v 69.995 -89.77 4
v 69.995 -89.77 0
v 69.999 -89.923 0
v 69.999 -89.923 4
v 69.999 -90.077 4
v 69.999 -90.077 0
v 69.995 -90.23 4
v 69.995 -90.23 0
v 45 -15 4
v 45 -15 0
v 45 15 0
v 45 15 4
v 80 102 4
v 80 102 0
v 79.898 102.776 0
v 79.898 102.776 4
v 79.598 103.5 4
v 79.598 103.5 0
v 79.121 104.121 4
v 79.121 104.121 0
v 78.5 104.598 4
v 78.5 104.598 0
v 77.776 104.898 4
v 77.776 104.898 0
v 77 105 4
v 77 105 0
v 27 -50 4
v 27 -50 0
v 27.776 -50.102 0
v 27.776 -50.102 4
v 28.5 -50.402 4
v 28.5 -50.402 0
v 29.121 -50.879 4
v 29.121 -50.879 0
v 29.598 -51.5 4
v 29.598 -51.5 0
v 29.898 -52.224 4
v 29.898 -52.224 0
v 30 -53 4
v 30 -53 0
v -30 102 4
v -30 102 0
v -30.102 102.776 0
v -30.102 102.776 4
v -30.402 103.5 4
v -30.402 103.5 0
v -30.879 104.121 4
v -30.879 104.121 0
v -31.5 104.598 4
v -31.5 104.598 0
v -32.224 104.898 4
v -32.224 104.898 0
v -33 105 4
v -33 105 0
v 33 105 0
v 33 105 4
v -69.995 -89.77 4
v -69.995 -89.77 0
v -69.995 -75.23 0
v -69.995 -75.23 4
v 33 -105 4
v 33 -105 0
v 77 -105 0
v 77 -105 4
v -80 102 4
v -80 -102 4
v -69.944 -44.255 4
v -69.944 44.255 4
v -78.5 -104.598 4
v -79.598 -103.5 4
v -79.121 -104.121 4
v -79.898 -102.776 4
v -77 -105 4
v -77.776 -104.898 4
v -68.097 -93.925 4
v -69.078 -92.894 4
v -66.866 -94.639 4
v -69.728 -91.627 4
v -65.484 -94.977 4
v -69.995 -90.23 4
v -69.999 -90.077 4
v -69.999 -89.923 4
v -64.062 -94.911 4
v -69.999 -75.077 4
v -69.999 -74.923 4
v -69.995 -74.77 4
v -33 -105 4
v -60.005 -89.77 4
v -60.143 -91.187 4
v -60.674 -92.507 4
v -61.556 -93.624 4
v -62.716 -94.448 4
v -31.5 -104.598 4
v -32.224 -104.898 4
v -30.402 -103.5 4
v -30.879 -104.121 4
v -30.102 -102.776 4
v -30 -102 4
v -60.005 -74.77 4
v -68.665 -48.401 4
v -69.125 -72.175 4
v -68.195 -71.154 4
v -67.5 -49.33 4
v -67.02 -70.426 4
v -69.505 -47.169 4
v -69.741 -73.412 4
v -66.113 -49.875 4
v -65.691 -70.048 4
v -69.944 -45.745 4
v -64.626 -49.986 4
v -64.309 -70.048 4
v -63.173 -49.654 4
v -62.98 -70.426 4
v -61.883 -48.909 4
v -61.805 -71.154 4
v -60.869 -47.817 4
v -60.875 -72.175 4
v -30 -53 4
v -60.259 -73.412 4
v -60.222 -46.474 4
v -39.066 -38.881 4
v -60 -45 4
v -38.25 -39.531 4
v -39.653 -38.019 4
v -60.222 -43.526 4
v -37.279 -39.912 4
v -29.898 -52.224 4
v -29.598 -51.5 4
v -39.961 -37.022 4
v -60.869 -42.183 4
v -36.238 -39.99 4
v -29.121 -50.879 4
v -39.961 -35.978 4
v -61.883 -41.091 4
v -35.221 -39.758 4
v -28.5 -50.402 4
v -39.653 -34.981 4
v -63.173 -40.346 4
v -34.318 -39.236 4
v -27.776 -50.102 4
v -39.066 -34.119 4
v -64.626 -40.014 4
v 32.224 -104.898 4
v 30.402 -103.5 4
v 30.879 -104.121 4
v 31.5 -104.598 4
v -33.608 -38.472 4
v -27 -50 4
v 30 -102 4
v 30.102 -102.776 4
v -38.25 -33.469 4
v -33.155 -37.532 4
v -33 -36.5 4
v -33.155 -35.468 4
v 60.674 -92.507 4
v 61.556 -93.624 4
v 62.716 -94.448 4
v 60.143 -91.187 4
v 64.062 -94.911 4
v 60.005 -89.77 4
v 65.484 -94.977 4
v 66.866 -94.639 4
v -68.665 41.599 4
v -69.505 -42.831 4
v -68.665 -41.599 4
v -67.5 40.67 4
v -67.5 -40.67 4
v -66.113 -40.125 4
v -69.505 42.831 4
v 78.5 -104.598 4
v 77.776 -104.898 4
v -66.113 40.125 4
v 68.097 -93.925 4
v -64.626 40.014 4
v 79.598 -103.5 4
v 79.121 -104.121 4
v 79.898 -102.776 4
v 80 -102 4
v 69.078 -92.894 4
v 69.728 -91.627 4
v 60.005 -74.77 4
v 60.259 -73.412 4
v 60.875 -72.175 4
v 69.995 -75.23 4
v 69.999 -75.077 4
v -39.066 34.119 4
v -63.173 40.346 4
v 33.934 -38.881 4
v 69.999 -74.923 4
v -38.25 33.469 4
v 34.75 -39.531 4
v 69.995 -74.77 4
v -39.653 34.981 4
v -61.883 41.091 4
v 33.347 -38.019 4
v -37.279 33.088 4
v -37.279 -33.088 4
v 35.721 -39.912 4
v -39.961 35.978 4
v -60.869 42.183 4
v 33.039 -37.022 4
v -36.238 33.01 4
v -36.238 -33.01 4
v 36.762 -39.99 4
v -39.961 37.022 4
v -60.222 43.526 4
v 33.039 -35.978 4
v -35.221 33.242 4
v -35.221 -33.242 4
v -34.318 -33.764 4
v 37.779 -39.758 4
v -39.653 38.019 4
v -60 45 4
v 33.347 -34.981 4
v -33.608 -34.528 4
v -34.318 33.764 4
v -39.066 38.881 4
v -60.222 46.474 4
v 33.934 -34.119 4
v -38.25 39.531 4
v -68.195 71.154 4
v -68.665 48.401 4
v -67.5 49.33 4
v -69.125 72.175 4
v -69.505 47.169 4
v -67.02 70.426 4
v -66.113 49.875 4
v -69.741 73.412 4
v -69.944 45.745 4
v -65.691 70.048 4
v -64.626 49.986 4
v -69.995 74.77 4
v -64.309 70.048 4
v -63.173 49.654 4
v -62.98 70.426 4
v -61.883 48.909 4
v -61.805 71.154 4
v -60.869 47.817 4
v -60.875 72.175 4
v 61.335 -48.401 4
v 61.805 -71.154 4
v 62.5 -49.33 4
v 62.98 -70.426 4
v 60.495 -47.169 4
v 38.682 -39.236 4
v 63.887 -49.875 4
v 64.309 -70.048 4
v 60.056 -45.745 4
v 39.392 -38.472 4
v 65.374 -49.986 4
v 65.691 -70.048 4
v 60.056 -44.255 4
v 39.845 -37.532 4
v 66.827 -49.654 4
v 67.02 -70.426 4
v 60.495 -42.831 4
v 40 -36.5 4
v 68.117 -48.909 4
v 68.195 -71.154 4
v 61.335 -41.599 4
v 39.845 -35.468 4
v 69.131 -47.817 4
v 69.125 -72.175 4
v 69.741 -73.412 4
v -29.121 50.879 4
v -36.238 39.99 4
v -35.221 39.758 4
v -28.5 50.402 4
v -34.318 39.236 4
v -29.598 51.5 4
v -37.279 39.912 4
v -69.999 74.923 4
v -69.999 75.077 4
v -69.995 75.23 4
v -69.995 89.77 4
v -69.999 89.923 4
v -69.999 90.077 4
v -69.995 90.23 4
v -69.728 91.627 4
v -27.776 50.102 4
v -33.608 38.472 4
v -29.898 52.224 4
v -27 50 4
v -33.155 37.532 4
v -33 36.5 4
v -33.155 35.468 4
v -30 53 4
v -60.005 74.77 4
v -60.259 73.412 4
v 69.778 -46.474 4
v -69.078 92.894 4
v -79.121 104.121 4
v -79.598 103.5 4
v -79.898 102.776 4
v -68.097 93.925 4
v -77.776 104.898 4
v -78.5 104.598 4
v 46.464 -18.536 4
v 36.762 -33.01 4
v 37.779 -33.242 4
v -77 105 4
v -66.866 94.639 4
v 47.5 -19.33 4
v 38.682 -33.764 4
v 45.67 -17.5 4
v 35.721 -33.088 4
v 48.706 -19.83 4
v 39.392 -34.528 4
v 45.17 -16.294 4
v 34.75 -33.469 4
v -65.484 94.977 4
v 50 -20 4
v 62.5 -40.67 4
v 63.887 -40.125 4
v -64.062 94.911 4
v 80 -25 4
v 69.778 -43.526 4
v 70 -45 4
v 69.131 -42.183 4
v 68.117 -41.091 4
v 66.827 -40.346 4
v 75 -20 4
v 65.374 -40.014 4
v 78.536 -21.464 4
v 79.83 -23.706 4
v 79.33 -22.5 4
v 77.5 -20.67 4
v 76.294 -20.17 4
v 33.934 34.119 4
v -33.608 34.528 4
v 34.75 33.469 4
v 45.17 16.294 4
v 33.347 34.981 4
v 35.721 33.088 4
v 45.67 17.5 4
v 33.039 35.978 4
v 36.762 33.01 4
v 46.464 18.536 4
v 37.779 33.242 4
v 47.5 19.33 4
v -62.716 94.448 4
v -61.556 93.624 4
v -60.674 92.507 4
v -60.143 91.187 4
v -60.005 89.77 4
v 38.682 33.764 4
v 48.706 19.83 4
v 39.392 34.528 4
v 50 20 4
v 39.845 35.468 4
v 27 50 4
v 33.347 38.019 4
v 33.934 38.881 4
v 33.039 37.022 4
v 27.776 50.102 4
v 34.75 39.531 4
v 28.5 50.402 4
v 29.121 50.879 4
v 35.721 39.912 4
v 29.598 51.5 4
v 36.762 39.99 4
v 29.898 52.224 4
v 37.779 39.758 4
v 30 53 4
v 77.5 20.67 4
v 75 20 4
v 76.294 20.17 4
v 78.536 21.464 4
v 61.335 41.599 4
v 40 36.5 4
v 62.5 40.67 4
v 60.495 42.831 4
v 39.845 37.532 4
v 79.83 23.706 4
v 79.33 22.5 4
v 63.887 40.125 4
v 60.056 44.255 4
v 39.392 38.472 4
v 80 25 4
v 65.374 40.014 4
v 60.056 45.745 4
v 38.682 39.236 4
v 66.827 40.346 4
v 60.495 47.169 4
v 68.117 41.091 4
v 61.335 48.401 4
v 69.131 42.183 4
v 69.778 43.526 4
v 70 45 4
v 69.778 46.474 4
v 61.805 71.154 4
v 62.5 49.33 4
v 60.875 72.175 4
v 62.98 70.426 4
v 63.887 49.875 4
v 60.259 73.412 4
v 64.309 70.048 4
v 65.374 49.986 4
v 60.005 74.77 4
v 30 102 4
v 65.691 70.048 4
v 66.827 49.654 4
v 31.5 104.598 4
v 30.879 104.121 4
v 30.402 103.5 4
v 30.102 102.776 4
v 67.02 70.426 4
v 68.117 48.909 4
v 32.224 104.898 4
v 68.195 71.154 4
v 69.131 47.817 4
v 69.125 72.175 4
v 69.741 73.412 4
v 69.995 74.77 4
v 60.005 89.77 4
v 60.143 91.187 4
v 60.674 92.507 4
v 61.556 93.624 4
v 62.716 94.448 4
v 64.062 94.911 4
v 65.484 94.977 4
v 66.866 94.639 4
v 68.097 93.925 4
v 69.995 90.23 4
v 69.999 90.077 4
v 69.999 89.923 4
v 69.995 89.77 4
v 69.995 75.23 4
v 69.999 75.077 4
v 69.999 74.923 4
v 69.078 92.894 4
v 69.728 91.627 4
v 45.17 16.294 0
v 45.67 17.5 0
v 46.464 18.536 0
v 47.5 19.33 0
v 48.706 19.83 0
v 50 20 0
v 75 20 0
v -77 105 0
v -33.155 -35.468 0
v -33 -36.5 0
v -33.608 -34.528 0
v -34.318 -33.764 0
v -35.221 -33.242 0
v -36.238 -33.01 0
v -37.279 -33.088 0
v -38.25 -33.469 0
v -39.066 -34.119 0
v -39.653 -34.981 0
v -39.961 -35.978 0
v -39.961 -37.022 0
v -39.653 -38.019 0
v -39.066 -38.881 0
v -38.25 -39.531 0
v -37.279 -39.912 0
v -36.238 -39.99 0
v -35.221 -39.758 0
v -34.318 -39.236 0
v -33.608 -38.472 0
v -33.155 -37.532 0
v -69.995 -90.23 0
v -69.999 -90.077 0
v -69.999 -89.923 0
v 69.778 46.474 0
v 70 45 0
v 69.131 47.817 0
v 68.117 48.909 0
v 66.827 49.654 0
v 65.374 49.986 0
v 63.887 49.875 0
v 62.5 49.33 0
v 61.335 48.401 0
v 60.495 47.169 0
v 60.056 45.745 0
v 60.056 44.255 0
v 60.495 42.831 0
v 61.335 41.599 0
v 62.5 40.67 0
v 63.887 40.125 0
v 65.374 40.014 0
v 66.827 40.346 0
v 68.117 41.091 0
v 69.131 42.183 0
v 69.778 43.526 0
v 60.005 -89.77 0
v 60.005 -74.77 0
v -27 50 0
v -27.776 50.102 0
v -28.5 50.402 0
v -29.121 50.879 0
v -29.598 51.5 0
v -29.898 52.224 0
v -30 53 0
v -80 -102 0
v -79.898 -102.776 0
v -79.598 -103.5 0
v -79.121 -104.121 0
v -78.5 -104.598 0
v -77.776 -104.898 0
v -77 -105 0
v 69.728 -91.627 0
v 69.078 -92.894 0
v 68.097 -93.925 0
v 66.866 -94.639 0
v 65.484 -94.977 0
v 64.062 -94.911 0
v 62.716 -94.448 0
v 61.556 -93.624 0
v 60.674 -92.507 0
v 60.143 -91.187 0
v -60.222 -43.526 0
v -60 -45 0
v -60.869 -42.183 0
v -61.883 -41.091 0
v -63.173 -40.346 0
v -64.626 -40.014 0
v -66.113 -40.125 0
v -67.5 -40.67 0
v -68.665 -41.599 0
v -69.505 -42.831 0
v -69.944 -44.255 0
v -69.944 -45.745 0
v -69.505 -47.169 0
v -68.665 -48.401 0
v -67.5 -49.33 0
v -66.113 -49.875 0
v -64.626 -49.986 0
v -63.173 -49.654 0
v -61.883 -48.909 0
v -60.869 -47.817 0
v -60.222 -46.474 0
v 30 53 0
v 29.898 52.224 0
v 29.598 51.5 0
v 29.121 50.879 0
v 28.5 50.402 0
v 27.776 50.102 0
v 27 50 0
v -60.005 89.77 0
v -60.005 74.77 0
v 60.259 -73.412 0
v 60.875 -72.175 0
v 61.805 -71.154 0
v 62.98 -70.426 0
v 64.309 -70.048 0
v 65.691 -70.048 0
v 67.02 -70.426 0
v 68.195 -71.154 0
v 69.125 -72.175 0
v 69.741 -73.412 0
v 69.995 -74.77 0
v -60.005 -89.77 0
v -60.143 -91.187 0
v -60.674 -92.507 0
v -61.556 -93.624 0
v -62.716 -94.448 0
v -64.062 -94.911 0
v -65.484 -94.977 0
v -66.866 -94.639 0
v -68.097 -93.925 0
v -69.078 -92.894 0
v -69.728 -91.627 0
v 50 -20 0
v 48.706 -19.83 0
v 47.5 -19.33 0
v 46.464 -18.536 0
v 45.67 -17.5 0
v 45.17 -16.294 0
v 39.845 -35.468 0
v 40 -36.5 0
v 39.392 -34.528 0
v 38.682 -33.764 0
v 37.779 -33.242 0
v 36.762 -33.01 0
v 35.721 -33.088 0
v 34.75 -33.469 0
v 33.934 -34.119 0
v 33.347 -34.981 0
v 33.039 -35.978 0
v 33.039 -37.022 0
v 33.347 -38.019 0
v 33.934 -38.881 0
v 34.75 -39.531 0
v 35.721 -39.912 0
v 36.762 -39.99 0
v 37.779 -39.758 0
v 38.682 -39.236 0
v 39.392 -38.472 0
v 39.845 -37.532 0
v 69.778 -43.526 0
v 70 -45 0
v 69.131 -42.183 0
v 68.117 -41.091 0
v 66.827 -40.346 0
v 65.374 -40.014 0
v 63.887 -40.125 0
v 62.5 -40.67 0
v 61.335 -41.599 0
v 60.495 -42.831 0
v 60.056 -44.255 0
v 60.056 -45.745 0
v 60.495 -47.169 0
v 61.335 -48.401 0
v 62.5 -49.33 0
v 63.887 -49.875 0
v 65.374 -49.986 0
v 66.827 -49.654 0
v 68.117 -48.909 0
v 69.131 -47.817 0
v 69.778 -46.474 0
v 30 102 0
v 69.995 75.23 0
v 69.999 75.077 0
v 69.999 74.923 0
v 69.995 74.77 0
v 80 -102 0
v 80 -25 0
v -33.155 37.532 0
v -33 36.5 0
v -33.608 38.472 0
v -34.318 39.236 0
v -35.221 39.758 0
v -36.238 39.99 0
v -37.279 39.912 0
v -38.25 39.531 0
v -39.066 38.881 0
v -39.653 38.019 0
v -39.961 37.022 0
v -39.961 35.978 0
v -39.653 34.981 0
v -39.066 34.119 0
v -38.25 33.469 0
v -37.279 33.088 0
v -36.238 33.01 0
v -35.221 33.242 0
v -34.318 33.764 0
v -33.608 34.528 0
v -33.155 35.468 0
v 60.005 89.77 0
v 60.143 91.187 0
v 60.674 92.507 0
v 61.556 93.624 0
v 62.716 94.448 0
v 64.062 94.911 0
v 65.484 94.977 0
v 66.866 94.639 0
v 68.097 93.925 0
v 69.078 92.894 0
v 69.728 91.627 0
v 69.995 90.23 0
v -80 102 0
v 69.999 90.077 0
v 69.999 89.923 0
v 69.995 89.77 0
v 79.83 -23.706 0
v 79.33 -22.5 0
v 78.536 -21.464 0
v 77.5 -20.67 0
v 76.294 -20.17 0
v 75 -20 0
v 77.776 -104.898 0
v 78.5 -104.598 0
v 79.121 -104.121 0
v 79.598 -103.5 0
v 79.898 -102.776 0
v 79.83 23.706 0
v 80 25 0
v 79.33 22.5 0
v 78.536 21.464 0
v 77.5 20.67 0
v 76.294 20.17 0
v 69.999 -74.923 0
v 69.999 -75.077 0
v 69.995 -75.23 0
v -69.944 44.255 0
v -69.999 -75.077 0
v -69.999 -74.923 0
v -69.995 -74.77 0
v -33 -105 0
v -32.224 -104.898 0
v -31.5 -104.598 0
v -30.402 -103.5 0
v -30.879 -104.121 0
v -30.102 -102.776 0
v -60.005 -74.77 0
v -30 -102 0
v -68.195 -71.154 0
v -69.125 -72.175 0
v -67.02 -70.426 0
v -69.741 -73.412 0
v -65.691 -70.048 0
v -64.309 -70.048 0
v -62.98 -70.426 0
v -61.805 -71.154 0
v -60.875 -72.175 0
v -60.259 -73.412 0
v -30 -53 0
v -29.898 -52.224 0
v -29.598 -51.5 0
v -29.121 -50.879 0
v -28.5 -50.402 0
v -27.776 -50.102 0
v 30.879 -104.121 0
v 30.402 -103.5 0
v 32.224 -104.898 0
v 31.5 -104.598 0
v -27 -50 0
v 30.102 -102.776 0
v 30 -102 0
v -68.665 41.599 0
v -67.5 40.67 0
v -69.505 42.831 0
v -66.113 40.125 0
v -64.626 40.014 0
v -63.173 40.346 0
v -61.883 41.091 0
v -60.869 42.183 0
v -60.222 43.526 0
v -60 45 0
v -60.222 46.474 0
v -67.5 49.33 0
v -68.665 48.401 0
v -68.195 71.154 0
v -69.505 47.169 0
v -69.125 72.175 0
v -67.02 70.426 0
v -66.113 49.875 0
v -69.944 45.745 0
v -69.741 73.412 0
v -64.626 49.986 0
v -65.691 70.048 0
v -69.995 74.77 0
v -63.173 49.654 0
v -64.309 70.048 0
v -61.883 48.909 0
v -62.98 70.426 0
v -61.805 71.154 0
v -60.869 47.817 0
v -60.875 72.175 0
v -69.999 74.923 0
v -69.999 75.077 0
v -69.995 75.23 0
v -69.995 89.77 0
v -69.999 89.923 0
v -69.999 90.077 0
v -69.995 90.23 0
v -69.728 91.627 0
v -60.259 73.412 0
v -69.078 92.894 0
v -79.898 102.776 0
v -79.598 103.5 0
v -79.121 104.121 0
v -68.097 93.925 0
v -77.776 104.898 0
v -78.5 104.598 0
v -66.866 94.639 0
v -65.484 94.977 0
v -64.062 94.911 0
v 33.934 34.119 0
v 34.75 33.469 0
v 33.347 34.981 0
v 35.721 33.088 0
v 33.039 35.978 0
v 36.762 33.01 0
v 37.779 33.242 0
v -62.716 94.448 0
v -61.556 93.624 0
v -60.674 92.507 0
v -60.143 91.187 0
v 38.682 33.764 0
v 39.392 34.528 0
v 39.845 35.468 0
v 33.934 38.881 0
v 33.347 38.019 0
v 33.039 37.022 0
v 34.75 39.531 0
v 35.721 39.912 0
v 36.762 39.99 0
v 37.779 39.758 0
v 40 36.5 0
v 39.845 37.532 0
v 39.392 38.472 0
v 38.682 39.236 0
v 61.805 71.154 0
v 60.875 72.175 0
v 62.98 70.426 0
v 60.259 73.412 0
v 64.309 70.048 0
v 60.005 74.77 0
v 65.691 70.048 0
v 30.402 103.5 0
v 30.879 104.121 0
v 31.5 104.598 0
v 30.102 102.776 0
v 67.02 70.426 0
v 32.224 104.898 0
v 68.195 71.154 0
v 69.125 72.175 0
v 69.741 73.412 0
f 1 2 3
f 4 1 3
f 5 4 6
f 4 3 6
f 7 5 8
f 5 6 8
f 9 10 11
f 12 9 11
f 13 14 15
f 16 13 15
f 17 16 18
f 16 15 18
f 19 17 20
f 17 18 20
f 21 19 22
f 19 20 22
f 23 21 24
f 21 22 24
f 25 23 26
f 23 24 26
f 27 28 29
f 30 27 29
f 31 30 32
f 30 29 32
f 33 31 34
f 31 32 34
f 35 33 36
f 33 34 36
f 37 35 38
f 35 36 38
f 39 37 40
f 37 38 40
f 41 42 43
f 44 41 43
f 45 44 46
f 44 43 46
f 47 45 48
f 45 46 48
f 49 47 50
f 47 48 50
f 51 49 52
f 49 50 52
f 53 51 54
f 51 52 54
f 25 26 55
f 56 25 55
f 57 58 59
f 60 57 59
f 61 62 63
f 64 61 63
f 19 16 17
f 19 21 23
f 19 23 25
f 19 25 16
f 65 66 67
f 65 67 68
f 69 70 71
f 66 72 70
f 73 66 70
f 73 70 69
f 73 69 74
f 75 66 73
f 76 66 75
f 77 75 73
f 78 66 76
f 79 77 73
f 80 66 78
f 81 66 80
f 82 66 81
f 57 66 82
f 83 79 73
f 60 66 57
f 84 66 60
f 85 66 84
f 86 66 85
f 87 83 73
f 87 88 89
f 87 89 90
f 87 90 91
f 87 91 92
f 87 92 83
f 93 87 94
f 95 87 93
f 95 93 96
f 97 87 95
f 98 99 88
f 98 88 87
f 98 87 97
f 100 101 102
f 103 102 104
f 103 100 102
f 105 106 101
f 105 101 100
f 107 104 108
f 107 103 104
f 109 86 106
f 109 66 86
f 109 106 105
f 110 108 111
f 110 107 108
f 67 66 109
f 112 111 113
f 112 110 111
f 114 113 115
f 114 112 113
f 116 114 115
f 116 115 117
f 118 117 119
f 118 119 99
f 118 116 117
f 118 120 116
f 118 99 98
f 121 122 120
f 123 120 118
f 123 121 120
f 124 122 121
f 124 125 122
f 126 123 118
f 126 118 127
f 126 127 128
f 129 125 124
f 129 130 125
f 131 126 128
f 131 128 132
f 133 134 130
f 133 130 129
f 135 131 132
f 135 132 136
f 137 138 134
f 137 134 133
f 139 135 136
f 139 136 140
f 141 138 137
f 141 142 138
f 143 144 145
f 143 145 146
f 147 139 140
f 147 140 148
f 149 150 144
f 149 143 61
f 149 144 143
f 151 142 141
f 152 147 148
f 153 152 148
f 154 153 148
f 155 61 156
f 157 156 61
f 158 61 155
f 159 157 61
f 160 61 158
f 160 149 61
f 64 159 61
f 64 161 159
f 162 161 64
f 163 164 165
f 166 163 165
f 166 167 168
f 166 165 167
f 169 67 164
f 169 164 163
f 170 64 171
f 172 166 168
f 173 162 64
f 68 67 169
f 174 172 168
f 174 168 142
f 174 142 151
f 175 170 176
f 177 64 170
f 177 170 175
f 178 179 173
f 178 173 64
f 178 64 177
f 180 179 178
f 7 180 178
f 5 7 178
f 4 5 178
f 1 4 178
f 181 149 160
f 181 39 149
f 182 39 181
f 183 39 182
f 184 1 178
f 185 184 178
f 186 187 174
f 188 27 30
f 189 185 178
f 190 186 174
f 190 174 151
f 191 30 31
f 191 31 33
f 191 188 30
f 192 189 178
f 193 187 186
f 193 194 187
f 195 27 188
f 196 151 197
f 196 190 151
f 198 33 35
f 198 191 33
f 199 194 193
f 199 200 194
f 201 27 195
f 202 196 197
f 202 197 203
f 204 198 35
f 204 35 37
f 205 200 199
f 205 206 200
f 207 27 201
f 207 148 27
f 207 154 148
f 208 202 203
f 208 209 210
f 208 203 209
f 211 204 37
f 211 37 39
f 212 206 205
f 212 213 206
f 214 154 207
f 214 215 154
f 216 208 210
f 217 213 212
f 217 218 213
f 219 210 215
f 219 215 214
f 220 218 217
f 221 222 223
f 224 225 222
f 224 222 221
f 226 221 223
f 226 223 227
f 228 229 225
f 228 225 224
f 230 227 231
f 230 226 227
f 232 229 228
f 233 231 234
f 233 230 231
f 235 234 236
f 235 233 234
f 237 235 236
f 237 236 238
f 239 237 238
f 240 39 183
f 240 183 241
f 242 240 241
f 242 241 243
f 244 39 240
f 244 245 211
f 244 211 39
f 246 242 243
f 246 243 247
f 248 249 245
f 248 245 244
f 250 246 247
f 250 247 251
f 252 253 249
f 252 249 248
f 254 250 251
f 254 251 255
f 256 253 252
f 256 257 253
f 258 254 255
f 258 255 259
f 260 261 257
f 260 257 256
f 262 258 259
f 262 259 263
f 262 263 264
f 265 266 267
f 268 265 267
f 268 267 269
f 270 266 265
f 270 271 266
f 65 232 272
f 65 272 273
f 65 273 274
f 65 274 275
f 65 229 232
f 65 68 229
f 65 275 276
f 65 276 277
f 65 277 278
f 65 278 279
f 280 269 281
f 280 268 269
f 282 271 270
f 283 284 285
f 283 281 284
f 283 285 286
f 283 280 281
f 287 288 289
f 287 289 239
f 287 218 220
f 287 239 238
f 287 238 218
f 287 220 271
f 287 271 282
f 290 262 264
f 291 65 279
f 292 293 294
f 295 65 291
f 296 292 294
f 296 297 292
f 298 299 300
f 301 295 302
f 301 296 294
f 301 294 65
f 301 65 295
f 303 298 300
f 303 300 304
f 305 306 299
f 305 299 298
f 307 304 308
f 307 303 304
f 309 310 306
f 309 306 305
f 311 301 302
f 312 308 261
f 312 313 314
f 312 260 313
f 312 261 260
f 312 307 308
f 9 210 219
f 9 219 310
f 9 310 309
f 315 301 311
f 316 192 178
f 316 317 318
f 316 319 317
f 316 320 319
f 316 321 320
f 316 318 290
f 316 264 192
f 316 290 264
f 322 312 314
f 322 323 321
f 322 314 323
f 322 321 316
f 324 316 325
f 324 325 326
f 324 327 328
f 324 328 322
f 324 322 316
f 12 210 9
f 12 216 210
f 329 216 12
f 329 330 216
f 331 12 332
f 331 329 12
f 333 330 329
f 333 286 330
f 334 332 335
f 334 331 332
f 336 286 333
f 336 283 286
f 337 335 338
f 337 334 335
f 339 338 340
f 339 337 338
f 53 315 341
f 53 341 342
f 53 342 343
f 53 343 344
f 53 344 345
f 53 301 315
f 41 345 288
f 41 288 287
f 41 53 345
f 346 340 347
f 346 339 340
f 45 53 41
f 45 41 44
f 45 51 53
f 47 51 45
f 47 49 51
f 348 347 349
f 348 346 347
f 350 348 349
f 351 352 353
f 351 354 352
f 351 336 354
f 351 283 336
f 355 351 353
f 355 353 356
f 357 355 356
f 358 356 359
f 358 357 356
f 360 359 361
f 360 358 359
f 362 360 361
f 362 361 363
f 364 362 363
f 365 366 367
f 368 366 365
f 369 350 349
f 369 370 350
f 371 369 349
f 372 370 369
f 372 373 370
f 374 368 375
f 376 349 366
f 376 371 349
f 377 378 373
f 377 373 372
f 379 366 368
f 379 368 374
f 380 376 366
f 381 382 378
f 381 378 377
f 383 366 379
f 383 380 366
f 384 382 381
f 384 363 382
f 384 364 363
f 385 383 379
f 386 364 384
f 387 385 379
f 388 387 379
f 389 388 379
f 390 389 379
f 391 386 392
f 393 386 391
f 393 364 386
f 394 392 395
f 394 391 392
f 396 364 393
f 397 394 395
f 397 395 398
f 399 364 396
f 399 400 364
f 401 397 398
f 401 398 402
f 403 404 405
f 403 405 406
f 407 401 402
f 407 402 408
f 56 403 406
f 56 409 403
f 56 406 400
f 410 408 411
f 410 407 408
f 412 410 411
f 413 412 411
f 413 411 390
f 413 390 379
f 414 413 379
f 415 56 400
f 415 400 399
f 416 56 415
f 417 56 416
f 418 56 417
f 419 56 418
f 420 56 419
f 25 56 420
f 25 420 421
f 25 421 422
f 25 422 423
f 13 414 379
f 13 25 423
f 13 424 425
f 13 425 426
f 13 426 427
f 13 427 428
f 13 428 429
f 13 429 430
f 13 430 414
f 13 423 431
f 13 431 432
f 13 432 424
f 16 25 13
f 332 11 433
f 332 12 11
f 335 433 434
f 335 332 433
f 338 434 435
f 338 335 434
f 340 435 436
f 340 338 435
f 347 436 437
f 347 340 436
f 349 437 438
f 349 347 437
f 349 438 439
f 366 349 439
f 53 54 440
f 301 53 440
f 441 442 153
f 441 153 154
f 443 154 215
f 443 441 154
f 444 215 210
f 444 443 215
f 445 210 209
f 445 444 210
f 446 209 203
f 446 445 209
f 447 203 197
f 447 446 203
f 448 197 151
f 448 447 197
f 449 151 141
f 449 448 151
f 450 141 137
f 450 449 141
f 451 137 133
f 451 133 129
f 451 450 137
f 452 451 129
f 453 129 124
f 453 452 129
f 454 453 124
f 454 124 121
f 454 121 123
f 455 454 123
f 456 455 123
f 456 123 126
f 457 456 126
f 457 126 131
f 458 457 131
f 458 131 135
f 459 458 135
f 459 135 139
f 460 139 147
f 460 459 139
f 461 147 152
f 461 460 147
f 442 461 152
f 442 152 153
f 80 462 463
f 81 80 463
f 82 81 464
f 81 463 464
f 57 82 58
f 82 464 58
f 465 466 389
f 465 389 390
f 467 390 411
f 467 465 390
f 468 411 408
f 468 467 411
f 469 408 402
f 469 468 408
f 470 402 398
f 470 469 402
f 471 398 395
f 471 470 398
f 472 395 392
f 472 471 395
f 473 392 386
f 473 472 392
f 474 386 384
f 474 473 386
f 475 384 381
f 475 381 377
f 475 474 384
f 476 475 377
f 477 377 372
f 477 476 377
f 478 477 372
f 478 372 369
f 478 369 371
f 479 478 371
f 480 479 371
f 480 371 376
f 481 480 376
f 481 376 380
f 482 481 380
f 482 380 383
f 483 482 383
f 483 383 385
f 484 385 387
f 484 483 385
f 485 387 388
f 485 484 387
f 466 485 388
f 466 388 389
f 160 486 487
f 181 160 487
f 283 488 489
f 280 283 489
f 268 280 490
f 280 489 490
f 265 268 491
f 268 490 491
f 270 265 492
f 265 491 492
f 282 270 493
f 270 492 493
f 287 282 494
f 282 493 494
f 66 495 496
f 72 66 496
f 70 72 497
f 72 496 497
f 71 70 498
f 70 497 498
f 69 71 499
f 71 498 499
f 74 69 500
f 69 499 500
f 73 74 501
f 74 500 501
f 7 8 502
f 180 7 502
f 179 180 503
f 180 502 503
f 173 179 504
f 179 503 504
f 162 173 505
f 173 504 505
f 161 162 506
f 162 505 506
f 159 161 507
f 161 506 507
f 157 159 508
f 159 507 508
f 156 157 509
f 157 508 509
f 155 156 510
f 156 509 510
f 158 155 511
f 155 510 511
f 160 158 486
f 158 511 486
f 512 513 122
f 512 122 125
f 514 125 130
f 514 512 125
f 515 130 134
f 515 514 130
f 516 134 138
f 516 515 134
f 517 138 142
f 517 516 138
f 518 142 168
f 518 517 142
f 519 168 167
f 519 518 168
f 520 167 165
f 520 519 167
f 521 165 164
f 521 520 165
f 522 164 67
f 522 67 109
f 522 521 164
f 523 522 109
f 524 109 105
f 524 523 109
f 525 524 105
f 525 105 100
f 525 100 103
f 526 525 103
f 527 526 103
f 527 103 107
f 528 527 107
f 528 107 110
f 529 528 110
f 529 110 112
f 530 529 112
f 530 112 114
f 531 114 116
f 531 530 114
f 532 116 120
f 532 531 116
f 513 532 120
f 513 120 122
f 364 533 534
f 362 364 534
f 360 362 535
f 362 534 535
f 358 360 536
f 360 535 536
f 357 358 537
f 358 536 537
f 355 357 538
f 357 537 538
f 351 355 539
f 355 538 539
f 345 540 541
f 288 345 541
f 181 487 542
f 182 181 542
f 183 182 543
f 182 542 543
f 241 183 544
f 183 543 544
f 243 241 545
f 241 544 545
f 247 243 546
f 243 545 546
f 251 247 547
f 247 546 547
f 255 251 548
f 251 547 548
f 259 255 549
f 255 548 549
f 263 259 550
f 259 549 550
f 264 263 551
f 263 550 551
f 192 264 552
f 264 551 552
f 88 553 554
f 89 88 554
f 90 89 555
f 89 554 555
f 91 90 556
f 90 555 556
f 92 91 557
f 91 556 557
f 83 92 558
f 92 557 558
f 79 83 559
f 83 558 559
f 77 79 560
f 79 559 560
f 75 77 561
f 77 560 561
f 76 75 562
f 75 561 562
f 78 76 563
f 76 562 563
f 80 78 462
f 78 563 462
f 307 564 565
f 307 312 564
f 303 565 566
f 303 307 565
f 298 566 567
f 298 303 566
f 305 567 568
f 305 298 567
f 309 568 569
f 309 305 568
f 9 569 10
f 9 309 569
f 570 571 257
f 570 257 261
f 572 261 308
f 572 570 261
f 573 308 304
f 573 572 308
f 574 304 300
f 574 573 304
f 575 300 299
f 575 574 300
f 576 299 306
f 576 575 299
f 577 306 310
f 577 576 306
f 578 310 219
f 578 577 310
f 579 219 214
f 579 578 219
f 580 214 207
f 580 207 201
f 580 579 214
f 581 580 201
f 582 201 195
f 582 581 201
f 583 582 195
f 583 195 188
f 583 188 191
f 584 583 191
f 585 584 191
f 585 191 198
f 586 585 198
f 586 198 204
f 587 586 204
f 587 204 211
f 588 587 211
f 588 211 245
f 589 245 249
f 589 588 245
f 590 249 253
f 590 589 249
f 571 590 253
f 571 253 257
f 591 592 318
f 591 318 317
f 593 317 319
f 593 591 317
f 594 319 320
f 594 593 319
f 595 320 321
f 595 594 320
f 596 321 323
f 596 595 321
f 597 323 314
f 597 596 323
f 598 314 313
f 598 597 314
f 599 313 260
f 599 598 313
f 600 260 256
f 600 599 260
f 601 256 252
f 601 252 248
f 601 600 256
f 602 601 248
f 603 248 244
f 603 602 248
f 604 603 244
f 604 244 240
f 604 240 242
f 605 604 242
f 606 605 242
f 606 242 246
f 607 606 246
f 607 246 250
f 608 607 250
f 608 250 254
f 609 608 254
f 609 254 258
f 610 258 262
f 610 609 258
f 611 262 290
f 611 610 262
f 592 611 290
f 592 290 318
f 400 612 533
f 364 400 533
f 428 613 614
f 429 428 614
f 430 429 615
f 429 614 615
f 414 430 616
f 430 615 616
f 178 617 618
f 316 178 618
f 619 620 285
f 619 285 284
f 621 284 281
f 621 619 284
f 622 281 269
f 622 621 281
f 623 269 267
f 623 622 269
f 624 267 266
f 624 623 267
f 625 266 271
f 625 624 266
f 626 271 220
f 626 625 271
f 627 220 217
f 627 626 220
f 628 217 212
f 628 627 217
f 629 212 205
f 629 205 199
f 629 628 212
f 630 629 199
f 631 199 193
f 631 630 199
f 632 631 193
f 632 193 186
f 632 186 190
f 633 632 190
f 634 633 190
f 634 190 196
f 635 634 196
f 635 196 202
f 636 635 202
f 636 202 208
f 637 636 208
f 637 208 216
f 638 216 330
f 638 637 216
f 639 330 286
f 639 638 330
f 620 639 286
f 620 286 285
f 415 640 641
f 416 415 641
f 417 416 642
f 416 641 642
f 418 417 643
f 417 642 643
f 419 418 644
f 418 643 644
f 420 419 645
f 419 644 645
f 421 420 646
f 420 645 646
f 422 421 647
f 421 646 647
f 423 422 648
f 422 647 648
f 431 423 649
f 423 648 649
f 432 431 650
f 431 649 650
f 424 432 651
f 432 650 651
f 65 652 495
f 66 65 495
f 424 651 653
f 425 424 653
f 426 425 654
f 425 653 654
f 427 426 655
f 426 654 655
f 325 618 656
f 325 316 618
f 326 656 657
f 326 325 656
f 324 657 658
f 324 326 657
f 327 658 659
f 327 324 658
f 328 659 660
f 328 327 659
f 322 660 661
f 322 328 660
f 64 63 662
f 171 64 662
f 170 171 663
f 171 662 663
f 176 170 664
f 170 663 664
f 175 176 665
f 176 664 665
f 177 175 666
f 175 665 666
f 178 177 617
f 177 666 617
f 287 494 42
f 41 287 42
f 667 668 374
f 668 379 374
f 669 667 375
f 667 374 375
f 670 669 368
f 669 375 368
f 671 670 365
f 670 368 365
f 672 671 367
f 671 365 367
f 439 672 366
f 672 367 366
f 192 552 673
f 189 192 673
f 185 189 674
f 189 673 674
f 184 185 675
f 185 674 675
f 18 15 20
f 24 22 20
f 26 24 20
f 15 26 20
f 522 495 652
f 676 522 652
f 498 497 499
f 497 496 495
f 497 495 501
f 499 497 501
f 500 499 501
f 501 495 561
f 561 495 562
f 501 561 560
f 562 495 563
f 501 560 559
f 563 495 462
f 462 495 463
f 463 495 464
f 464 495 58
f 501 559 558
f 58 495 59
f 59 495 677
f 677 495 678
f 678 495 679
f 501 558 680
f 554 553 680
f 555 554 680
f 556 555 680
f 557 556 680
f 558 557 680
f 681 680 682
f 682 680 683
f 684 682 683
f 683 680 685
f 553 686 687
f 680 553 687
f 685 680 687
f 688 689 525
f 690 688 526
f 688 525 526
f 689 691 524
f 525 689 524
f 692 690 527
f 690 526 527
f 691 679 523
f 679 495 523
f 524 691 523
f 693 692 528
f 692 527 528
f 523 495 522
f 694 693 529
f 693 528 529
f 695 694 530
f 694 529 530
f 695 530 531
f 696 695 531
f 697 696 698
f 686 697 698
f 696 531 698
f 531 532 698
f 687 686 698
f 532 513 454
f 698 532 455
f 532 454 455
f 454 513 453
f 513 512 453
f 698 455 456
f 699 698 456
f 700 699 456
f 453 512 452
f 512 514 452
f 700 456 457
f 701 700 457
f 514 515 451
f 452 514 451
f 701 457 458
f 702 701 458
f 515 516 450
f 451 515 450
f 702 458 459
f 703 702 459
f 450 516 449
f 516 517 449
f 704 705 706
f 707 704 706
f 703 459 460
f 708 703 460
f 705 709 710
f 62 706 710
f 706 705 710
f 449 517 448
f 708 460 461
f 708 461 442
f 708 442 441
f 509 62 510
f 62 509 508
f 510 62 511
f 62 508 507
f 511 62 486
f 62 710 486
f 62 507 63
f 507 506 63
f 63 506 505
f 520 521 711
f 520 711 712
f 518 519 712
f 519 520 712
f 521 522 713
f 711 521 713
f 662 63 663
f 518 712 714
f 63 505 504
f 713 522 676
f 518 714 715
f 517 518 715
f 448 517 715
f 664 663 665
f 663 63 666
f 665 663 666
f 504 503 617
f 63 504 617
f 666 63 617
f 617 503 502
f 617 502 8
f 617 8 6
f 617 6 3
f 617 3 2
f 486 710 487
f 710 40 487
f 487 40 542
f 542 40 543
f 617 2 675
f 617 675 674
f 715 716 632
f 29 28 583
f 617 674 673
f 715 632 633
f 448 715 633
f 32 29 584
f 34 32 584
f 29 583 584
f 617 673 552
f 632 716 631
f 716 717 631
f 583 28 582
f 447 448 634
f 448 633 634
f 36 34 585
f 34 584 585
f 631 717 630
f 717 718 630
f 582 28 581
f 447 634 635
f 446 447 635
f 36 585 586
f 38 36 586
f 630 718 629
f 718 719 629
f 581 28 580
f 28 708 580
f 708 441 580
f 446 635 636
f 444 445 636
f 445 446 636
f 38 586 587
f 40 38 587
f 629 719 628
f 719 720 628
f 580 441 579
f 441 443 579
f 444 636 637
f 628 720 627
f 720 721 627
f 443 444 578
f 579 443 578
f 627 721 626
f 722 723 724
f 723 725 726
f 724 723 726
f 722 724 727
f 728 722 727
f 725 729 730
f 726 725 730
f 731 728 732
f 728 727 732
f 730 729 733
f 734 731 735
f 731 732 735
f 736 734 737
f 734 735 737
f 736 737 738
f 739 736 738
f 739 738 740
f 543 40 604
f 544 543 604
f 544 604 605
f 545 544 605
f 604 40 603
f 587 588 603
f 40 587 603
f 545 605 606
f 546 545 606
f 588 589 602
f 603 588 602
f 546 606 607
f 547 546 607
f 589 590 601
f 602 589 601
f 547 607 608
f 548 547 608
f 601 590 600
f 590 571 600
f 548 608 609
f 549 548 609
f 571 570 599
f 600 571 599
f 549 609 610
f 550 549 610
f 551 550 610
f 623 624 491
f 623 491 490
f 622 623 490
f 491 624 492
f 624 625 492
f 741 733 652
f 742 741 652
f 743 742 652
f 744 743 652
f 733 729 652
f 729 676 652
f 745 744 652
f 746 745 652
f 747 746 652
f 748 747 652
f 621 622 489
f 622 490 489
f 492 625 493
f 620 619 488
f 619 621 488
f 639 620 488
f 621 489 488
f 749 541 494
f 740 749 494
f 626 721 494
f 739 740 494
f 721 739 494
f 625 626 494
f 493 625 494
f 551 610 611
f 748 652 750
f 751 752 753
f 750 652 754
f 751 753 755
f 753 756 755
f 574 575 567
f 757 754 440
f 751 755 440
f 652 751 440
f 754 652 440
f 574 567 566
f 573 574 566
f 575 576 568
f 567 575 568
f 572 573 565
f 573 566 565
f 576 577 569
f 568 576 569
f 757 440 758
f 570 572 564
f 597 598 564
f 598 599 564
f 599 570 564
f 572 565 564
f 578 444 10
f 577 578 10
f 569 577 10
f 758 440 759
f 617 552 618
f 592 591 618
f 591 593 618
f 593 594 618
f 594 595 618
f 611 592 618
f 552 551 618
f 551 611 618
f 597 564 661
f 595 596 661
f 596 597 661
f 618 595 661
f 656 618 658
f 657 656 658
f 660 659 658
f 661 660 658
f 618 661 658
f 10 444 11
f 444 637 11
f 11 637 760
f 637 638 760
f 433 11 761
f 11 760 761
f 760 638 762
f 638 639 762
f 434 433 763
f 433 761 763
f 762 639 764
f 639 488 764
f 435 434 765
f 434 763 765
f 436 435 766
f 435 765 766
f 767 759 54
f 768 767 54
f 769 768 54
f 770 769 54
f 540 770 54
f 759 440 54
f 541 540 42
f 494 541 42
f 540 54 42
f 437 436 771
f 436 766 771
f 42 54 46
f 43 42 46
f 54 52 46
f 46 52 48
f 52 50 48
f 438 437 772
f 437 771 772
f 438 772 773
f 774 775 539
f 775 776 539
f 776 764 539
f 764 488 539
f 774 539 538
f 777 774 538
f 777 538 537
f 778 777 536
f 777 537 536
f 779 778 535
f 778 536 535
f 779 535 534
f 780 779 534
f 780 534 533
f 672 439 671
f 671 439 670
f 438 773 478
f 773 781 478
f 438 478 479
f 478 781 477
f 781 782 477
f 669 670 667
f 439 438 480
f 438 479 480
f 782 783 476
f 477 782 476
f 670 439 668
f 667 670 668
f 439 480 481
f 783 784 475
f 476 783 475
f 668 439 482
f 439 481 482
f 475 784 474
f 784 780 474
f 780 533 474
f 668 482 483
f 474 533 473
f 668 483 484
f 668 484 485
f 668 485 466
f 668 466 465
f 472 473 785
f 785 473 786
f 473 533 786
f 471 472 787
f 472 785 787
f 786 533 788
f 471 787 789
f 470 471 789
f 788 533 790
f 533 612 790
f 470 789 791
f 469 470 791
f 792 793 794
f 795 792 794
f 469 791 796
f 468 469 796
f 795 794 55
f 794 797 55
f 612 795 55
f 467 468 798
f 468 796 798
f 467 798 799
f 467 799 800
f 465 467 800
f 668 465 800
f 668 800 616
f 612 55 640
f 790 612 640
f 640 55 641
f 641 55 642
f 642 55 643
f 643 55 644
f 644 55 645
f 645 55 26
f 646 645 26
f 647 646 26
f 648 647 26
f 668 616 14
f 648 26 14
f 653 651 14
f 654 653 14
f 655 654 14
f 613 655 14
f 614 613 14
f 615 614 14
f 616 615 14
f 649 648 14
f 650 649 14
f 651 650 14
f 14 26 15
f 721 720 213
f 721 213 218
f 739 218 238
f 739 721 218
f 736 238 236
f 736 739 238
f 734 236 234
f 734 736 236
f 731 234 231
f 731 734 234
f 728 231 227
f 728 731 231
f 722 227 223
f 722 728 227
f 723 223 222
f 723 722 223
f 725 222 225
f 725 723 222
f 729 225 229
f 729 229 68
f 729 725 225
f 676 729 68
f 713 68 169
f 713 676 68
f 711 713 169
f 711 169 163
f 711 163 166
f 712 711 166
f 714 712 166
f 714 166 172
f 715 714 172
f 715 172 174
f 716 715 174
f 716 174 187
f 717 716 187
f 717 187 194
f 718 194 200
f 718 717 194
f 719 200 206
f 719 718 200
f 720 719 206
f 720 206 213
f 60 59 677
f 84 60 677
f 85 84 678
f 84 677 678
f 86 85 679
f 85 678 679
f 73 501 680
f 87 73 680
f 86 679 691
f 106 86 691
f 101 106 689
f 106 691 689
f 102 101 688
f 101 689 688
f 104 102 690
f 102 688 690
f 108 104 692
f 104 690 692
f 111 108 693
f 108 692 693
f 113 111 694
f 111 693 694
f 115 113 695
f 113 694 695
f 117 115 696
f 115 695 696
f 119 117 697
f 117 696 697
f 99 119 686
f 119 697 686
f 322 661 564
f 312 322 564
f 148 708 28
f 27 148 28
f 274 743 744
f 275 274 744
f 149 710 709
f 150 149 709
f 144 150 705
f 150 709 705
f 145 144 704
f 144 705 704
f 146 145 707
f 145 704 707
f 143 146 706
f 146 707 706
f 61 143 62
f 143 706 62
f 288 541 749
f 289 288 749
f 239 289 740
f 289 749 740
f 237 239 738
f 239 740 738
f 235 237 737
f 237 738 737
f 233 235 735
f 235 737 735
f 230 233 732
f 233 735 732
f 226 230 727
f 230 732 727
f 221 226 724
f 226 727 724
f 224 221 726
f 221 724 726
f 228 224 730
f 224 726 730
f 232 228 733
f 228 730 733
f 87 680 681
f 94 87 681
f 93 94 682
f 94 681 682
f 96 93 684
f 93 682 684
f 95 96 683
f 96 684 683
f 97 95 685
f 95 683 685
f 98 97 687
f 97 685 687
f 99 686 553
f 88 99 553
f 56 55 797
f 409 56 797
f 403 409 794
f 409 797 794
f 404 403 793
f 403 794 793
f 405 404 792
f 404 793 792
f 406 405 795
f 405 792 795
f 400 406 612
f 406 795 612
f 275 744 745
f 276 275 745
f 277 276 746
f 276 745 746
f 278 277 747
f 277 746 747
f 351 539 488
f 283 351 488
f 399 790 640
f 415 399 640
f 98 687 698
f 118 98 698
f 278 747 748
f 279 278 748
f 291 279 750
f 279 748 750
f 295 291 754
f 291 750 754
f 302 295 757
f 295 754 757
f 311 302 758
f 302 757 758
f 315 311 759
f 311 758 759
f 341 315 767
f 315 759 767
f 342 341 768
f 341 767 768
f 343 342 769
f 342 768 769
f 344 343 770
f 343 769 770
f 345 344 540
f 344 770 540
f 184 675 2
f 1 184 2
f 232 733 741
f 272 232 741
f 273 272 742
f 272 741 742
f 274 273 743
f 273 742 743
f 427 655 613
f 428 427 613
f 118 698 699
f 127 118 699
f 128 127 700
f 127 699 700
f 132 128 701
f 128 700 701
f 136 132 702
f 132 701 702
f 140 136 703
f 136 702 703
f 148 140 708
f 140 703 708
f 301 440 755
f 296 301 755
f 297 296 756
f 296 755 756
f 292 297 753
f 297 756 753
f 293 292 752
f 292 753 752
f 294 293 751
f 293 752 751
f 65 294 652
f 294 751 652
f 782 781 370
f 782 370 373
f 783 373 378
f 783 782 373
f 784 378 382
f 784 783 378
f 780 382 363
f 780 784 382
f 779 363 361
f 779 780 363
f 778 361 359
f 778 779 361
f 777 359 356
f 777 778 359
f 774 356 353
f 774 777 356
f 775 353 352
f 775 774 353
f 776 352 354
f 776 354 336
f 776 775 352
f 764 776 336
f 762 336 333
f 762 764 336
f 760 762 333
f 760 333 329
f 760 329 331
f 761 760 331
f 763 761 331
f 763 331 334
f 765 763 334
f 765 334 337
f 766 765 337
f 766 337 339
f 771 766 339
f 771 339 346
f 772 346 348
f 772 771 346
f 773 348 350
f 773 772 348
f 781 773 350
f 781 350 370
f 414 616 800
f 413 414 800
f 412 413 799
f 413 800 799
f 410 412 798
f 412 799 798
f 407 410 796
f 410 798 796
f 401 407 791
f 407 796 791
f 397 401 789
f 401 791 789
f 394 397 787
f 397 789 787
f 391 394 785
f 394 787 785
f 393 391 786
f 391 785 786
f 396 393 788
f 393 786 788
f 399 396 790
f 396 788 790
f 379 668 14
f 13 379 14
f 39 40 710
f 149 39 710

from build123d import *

# Parameters (mm, degrees)
F0_R     = 5
F0_R_2   = 3.5
F1_DEPTH = 4
F2_R     = 5


with BuildPart() as f1:
    # F0 (on Top) → F1 (new body)
    with BuildSketch(Plane.XY):
        with BuildLine():
            ThreePointArc((-80, -102), (-79.12132, -104.12132), (-77, -105))
            Line((-77, -105), (-33, -105))
            ThreePointArc((-33, -105), (-30.87868, -104.12132), (-30, -102))
            Line((-30, -102), (-30, -53))
            ThreePointArc((-30, -53), (-29.12132, -50.87868), (-27, -50))
            Line((-27, -50), (27, -50))
            ThreePointArc((27, -50), (29.12132, -50.87868), (30, -53))
            Line((30, -53), (30, -102))
            ThreePointArc((30, -102), (30.87868, -104.12132), (33, -105))
            Line((33, -105), (77, -105))
            ThreePointArc((77, -105), (79.12132, -104.12132), (80, -102))
            Line((80, -102), (80, -20))
            Line((80, -20), (45, -20))
            Line((45, -20), (45, 20))
            Line((45, 20), (80, 20))
            Line((80, 20), (80, 102))
            ThreePointArc((80, 102), (79.12132, 104.12132), (77, 105))
            Line((77, 105), (33, 105))
            ThreePointArc((33, 105), (30.87868, 104.12132), (30, 102))
            Line((30, 102), (30, 53))
            ThreePointArc((30, 53), (29.12132, 50.87868), (27, 50))
            Line((27, 50), (-27, 50))
            ThreePointArc((-27, 50), (-29.12132, 50.87868), (-30, 53))
            Line((-30, 53), (-30, 102))
            ThreePointArc((-30, 102), (-30.87868, 104.12132), (-33, 105))
            Line((-33, 105), (-77, 105))
            ThreePointArc((-77, 105), (-79.12132, 104.12132), (-80, 102))
            Line((-80, 102), (-80, -102))
        make_face()
        with BuildLine():
            Line((-69.994725, -89.77039), (-69.994725, -75.22961))
            ThreePointArc((-69.994725, -75.22961), (-70, -75), (-69.994725, -74.77039))
            ThreePointArc((-69.994725, -74.77039), (-65, -70), (-60.005275, -74.77039))
            Line((-60.005275, -74.77039), (-60.005275, -89.77039))
            ThreePointArc((-60.005275, -89.77039), (-64.77039, -94.994725), (-69.994725, -90.22961))
            ThreePointArc((-69.994725, -90.22961), (-70, -90), (-69.994725, -89.77039))
        make_face(mode=Mode.SUBTRACT)
        with Locations((-65, -45)):
            Circle(F0_R, mode=Mode.SUBTRACT)
        with Locations((-36.5, -36.5)):
            Circle(F0_R_2, mode=Mode.SUBTRACT)
        with BuildLine():
            ThreePointArc((69.994725, -74.77039), (70, -75), (69.994725, -75.22961))
            Line((69.994725, -75.22961), (69.994725, -89.77039))
            ThreePointArc((69.994725, -89.77039), (70, -90), (69.994725, -90.22961))
            ThreePointArc((69.994725, -90.22961), (64.77039, -94.994725), (60.005275, -89.77039))
            Line((60.005275, -89.77039), (60.005275, -74.77039))
            ThreePointArc((60.005275, -74.77039), (65, -70), (69.994725, -74.77039))
        make_face(mode=Mode.SUBTRACT)
        with Locations((36.5, -36.5)):
            Circle(F0_R_2, mode=Mode.SUBTRACT)
        with Locations((65, -45)):
            Circle(F0_R, mode=Mode.SUBTRACT)
        with Locations((-65, 45)):
            Circle(F0_R, mode=Mode.SUBTRACT)
        with Locations((-36.5, 36.5)):
            Circle(F0_R_2, mode=Mode.SUBTRACT)
        with BuildLine():
            ThreePointArc((-69.994725, 90.22961), (-64.77039, 94.994725), (-60.005275, 89.77039))
            Line((-60.005275, 89.77039), (-60.005275, 74.77039))
            ThreePointArc((-60.005275, 74.77039), (-65, 70), (-69.994725, 74.77039))
            ThreePointArc((-69.994725, 74.77039), (-70, 75), (-69.994725, 75.22961))
            Line((-69.994725, 75.22961), (-69.994725, 89.77039))
            ThreePointArc((-69.994725, 89.77039), (-70, 90), (-69.994725, 90.22961))
        make_face(mode=Mode.SUBTRACT)
        with Locations((36.5, 36.5)):
            Circle(F0_R_2, mode=Mode.SUBTRACT)
        with Locations((65, 45)):
            Circle(F0_R, mode=Mode.SUBTRACT)
        with BuildLine():
            Line((69.994725, 89.77039), (69.994725, 75.22961))
            ThreePointArc((69.994725, 75.22961), (70, 75), (69.994725, 74.77039))
            ThreePointArc((69.994725, 74.77039), (65, 70), (60.005275, 74.77039))
            Line((60.005275, 74.77039), (60.005275, 89.77039))
            ThreePointArc((60.005275, 89.77039), (64.77039, 94.994725), (69.994725, 90.22961))
            ThreePointArc((69.994725, 90.22961), (70, 90), (69.994725, 89.77039))
        make_face(mode=Mode.SUBTRACT)
    extrude(amount=F1_DEPTH)

    # F2
    f2_edges = [f1.edges().sort_by_distance(p)[0] for p in [
        (80, -20, 2),
        (45, -20, 2),
        (45, 20, 2),
        (80, 20, 2),
    ]]
    fillet(f2_edges, radius=F2_R)


solid = f1.part
